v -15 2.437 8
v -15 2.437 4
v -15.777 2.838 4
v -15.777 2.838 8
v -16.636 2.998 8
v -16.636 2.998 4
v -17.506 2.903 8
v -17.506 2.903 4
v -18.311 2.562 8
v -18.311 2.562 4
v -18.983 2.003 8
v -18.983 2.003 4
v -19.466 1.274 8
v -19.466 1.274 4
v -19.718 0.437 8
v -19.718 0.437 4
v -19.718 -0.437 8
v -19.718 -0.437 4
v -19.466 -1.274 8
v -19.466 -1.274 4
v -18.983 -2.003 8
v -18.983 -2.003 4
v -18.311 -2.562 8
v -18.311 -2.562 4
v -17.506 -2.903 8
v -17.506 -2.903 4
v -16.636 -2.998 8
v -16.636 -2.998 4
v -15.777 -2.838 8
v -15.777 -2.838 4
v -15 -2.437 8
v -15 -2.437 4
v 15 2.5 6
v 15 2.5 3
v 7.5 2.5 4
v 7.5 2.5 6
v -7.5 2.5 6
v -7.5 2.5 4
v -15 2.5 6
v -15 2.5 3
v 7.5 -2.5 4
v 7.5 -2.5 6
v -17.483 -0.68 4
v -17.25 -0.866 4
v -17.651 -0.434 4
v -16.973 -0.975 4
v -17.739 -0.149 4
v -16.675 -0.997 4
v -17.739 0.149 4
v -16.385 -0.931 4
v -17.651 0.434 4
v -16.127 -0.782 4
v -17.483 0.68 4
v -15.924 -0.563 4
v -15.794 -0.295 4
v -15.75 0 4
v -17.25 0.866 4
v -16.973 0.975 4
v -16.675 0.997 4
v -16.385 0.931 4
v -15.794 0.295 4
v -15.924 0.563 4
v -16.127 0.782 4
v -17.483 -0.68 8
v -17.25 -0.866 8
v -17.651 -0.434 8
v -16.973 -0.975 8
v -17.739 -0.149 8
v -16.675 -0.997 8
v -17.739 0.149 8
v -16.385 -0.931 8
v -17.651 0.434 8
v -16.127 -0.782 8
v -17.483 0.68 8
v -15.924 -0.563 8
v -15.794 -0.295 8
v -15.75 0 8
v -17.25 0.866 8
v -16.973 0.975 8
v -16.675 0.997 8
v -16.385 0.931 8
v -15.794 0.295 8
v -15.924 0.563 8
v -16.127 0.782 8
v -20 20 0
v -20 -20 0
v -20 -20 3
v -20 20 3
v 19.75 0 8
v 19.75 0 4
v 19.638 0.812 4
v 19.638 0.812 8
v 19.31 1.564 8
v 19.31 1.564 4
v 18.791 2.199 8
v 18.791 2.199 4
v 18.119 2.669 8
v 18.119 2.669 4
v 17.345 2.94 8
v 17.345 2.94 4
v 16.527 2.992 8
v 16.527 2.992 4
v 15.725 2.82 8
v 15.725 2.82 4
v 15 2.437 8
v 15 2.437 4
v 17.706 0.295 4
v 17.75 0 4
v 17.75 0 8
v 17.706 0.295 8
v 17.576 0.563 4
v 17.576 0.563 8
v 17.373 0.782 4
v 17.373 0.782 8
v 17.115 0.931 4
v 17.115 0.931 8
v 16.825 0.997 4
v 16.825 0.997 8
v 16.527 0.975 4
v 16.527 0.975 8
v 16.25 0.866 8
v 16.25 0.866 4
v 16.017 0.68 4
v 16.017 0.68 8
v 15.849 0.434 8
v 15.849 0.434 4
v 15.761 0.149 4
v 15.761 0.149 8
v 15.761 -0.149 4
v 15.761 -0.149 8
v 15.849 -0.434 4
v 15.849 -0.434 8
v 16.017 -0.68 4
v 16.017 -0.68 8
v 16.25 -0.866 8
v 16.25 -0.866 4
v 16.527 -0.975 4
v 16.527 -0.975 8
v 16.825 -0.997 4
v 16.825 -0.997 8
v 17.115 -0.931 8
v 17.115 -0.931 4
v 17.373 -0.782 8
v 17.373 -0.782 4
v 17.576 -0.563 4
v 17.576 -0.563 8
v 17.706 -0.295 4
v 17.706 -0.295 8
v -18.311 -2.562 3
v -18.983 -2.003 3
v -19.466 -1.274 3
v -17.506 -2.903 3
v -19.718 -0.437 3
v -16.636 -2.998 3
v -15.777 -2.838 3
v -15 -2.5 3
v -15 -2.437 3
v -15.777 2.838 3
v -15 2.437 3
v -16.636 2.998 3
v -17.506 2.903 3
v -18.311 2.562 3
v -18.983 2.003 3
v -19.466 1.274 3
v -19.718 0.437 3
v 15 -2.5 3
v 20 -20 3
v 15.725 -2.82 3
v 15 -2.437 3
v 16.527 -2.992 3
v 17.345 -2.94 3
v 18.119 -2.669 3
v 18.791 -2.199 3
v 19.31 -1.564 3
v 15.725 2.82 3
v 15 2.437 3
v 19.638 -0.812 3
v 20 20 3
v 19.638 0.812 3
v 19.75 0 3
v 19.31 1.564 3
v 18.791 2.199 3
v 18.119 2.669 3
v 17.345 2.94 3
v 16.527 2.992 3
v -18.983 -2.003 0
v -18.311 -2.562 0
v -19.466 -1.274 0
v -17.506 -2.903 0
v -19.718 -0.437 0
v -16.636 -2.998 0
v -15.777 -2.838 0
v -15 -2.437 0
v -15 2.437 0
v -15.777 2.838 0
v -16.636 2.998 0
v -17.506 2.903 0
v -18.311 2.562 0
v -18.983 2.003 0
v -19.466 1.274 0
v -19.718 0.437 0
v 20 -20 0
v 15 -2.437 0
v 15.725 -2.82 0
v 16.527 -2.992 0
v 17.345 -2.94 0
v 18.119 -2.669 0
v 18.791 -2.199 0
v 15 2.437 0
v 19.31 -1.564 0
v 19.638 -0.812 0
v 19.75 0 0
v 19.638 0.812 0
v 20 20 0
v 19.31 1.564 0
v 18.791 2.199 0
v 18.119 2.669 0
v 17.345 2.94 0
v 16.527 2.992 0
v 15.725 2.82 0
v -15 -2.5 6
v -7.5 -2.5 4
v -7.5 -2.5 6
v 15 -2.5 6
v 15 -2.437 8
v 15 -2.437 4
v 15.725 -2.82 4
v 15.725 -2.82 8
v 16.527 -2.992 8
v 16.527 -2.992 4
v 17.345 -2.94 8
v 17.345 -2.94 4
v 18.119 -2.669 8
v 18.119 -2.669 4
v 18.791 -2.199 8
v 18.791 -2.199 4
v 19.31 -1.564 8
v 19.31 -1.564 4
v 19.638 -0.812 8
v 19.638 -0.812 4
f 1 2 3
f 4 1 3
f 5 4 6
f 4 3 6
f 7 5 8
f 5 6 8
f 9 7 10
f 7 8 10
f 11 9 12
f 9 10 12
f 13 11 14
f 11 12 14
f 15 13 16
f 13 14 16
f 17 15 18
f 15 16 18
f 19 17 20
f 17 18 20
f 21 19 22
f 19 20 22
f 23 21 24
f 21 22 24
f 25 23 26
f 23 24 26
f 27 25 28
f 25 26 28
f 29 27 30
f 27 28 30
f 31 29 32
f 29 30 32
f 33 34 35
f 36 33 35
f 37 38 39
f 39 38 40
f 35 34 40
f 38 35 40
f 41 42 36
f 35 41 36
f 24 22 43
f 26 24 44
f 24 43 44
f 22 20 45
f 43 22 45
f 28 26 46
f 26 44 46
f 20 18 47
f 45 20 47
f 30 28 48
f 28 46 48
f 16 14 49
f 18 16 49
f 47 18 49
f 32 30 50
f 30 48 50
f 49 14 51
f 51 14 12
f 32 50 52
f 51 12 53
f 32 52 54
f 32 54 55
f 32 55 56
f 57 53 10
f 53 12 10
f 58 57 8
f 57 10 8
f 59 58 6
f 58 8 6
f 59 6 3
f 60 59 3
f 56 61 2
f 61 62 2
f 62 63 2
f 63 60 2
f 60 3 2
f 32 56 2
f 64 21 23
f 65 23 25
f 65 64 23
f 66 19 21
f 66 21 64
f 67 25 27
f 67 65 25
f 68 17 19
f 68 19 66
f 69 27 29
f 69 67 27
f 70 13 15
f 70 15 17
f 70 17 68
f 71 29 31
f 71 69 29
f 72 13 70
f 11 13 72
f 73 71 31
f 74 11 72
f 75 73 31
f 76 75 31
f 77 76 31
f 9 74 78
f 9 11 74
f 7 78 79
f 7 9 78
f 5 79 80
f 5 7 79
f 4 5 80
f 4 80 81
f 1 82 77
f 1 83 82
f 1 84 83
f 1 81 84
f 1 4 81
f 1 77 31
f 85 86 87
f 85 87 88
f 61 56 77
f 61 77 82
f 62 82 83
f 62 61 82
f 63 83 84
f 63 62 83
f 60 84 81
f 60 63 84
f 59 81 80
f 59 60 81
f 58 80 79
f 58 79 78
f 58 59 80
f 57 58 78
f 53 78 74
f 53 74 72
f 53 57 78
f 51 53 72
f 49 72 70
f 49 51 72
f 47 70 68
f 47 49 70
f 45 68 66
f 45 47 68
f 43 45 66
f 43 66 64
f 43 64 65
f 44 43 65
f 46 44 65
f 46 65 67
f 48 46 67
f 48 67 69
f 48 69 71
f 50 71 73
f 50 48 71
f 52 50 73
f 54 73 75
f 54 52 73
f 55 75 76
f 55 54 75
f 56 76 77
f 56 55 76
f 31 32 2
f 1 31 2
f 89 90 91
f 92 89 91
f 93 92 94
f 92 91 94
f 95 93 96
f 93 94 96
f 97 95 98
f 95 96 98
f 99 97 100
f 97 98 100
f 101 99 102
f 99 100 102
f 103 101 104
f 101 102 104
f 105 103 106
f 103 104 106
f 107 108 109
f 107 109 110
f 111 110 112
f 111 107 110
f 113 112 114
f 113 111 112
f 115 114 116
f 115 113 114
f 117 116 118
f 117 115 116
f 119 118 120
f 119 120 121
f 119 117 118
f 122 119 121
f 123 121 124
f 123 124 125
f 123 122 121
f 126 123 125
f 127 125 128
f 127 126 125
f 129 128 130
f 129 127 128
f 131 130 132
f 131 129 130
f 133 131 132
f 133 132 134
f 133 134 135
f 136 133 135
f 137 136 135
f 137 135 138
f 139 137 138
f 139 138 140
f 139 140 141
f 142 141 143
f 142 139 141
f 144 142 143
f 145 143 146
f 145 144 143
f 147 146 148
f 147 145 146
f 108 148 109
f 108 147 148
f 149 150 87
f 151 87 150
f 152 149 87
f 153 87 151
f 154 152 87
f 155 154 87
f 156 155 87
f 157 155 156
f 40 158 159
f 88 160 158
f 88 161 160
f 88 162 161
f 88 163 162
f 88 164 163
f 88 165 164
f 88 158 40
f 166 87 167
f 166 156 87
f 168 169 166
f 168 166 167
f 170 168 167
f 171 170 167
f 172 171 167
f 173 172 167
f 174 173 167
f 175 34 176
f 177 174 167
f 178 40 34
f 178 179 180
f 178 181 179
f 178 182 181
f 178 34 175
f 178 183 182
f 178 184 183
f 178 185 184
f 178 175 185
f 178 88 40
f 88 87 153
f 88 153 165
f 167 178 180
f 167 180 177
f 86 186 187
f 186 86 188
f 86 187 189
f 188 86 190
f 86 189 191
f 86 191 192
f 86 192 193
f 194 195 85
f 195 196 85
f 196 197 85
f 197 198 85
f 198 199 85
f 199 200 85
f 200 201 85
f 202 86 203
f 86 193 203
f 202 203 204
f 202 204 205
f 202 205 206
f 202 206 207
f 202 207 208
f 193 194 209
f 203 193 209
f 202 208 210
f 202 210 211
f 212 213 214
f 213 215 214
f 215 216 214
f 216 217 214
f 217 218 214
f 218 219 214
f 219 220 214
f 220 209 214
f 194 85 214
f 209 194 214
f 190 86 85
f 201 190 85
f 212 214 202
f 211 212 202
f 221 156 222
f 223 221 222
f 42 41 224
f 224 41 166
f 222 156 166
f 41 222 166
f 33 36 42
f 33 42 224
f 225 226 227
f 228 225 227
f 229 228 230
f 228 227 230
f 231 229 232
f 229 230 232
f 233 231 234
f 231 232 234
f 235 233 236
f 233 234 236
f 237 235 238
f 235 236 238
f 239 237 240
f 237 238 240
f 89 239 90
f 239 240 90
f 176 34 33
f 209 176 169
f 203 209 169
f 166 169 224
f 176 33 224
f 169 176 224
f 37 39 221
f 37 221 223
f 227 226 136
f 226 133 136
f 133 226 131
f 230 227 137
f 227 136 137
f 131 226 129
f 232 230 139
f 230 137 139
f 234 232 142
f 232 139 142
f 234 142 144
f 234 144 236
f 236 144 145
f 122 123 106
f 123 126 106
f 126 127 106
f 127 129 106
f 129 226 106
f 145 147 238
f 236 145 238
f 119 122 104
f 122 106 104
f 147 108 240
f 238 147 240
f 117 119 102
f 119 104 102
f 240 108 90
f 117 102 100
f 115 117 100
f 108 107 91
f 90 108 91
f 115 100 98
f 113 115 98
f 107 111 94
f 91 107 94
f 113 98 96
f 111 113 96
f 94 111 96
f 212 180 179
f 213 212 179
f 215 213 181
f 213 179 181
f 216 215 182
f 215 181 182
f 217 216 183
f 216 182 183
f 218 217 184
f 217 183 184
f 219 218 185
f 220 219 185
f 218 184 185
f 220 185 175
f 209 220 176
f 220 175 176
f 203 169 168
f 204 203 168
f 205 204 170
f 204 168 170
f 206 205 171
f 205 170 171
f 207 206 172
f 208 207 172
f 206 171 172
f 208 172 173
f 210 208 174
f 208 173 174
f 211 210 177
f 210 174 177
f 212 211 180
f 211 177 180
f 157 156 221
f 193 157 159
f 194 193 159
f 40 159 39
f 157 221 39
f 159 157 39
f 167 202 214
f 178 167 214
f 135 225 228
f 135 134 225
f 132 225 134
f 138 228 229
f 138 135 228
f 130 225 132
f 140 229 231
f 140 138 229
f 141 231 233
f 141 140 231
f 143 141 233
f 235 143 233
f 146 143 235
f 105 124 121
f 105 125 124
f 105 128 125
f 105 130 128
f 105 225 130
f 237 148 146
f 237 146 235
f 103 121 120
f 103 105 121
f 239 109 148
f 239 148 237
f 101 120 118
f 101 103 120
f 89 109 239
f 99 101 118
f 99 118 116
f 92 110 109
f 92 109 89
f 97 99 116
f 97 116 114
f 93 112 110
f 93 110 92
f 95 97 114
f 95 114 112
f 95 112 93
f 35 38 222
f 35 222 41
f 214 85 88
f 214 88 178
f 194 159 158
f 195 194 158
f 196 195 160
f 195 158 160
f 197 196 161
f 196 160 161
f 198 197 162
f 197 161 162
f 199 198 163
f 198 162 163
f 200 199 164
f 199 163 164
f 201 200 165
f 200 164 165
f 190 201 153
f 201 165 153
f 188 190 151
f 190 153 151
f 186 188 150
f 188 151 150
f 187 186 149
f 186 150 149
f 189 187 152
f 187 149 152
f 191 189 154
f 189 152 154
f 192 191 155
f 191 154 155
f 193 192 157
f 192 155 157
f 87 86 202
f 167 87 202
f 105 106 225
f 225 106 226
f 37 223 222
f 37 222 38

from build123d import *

# Parameters (mm, degrees)
F0_W     = 40
F0_H     = 40
F1_DEPTH = 3
F3_DEPTH = 3
F4_START = 1
F2_R     = 1
F4_DEPTH = 4
F5_DEPTH = 25
F6_W     = 15
F6_H     = 5
F7_DEPTH = 2


with BuildPart() as f1:
    # F0 (on Top) → F1 (new body)
    with BuildSketch(Plane.XY):
        Rectangle(F0_W, F0_H)
    extrude(amount=F1_DEPTH)

    # F2 (on face) → F3 (join)
    with BuildSketch(Plane.XY.offset(3)):
        with BuildLine():
            Line((15, 2.5), (-15, 2.5))
            Line((-15, 2.5), (-15, 2.4366985862))
            ThreePointArc((-15, 2.4366985862), (-14.080730437, 1.3693063938), (-13.75, 0))
            ThreePointArc((-13.75, 0), (-14.080730437, -1.3693063938), (-15, -2.4366985862))
            Line((-15, -2.4366985862), (-15, -2.5))
            Line((-15, -2.5), (15, -2.5))
            Line((15, -2.5), (15, -2.4366985862))
            ThreePointArc((15, -2.4366985862), (13.75, 0), (15, 2.4366985862))
            Line((15, 2.4366985862), (15, 2.5))
        make_face()
        with BuildLine():
            Line((-13.75, 0), (-15, 0))
            Line((-15, 0), (-15, -2.4366985862))
            ThreePointArc((-15, -2.4366985862), (-14.080730437, -1.3693063938), (-13.75, 0))
        make_face()
        with BuildLine():
            ThreePointArc((-13.75, 0), (-14.080730437, 1.3693063938), (-15, 2.4366985862))
            Line((-15, 2.4366985862), (-15, 0))
            Line((-15, 0), (-13.75, 0))
        make_face()
        with BuildLine():
            Line((15, -2.4366985862), (15, 2.4366985862))
            ThreePointArc((15, 2.4366985862), (13.75, 0), (15, -2.4366985862))
        make_face()
    extrude(amount=F3_DEPTH)

    # F2 (on face) → F5 (cut)
    with BuildSketch(Plane.XY.offset(3)):
        with BuildLine():
            Line((-15, 0), (-15, 2.4366985862))
            ThreePointArc((-15, 2.4366985862), (-19.75, 0), (-15, -2.4366985862))
            Line((-15, -2.4366985862), (-15, 0))
        make_face()
        with Locations((-16.75, 0)):
            Circle(F2_R, mode=Mode.SUBTRACT)
        with Locations((-16.75, 0)):
            Circle(F2_R)
        with BuildLine():
            ThreePointArc((19.75, 0), (18.1193063938, 2.669269563), (15, 2.4366985862))
            Line((15, 2.4366985862), (15, -2.4366985862))
            ThreePointArc((15, -2.4366985862), (18.1193063938, -2.669269563), (19.75, 0))
        make_face()
        with Locations((16.75, 0)):
            Circle(F2_R, mode=Mode.SUBTRACT)
        with Locations((16.75, 0)):
            Circle(F2_R)
    extrude(amount=-F5_DEPTH, mode=Mode.SUBTRACT)

    # F6 (on face) → F7 (cut)
    with BuildSketch(Plane.XY.offset(6)):
        Rectangle(F6_W, F6_H)
    extrude(amount=-F7_DEPTH, mode=Mode.SUBTRACT)


with BuildPart() as f4:
    # F2 (on face) → F4 (new body)
    with BuildSketch(Plane.XY.offset(3).offset(F4_START)):
        with BuildLine():
            Line((-15, 0), (-15, 2.4366985862))
            ThreePointArc((-15, 2.4366985862), (-19.75, 0), (-15, -2.4366985862))
            Line((-15, -2.4366985862), (-15, 0))
        make_face()
        with Locations((-16.75, 0)):
            Circle(F2_R, mode=Mode.SUBTRACT)
    extrude(amount=F4_DEPTH)


with BuildPart() as f4b:
    # F2 (on face) → F4, piece 2 (new body)
    with BuildSketch(Plane.XY.offset(3).offset(F4_START)):
        with BuildLine():
            ThreePointArc((19.75, 0), (18.1193063938, 2.669269563), (15, 2.4366985862))
            Line((15, 2.4366985862), (15, -2.4366985862))
            ThreePointArc((15, -2.4366985862), (18.1193063938, -2.669269563), (19.75, 0))
        make_face()
        with Locations((16.75, 0)):
            Circle(F2_R, mode=Mode.SUBTRACT)
    extrude(amount=F4_DEPTH)


solid = Compound([f1.part, f4.part, f4b.part])
